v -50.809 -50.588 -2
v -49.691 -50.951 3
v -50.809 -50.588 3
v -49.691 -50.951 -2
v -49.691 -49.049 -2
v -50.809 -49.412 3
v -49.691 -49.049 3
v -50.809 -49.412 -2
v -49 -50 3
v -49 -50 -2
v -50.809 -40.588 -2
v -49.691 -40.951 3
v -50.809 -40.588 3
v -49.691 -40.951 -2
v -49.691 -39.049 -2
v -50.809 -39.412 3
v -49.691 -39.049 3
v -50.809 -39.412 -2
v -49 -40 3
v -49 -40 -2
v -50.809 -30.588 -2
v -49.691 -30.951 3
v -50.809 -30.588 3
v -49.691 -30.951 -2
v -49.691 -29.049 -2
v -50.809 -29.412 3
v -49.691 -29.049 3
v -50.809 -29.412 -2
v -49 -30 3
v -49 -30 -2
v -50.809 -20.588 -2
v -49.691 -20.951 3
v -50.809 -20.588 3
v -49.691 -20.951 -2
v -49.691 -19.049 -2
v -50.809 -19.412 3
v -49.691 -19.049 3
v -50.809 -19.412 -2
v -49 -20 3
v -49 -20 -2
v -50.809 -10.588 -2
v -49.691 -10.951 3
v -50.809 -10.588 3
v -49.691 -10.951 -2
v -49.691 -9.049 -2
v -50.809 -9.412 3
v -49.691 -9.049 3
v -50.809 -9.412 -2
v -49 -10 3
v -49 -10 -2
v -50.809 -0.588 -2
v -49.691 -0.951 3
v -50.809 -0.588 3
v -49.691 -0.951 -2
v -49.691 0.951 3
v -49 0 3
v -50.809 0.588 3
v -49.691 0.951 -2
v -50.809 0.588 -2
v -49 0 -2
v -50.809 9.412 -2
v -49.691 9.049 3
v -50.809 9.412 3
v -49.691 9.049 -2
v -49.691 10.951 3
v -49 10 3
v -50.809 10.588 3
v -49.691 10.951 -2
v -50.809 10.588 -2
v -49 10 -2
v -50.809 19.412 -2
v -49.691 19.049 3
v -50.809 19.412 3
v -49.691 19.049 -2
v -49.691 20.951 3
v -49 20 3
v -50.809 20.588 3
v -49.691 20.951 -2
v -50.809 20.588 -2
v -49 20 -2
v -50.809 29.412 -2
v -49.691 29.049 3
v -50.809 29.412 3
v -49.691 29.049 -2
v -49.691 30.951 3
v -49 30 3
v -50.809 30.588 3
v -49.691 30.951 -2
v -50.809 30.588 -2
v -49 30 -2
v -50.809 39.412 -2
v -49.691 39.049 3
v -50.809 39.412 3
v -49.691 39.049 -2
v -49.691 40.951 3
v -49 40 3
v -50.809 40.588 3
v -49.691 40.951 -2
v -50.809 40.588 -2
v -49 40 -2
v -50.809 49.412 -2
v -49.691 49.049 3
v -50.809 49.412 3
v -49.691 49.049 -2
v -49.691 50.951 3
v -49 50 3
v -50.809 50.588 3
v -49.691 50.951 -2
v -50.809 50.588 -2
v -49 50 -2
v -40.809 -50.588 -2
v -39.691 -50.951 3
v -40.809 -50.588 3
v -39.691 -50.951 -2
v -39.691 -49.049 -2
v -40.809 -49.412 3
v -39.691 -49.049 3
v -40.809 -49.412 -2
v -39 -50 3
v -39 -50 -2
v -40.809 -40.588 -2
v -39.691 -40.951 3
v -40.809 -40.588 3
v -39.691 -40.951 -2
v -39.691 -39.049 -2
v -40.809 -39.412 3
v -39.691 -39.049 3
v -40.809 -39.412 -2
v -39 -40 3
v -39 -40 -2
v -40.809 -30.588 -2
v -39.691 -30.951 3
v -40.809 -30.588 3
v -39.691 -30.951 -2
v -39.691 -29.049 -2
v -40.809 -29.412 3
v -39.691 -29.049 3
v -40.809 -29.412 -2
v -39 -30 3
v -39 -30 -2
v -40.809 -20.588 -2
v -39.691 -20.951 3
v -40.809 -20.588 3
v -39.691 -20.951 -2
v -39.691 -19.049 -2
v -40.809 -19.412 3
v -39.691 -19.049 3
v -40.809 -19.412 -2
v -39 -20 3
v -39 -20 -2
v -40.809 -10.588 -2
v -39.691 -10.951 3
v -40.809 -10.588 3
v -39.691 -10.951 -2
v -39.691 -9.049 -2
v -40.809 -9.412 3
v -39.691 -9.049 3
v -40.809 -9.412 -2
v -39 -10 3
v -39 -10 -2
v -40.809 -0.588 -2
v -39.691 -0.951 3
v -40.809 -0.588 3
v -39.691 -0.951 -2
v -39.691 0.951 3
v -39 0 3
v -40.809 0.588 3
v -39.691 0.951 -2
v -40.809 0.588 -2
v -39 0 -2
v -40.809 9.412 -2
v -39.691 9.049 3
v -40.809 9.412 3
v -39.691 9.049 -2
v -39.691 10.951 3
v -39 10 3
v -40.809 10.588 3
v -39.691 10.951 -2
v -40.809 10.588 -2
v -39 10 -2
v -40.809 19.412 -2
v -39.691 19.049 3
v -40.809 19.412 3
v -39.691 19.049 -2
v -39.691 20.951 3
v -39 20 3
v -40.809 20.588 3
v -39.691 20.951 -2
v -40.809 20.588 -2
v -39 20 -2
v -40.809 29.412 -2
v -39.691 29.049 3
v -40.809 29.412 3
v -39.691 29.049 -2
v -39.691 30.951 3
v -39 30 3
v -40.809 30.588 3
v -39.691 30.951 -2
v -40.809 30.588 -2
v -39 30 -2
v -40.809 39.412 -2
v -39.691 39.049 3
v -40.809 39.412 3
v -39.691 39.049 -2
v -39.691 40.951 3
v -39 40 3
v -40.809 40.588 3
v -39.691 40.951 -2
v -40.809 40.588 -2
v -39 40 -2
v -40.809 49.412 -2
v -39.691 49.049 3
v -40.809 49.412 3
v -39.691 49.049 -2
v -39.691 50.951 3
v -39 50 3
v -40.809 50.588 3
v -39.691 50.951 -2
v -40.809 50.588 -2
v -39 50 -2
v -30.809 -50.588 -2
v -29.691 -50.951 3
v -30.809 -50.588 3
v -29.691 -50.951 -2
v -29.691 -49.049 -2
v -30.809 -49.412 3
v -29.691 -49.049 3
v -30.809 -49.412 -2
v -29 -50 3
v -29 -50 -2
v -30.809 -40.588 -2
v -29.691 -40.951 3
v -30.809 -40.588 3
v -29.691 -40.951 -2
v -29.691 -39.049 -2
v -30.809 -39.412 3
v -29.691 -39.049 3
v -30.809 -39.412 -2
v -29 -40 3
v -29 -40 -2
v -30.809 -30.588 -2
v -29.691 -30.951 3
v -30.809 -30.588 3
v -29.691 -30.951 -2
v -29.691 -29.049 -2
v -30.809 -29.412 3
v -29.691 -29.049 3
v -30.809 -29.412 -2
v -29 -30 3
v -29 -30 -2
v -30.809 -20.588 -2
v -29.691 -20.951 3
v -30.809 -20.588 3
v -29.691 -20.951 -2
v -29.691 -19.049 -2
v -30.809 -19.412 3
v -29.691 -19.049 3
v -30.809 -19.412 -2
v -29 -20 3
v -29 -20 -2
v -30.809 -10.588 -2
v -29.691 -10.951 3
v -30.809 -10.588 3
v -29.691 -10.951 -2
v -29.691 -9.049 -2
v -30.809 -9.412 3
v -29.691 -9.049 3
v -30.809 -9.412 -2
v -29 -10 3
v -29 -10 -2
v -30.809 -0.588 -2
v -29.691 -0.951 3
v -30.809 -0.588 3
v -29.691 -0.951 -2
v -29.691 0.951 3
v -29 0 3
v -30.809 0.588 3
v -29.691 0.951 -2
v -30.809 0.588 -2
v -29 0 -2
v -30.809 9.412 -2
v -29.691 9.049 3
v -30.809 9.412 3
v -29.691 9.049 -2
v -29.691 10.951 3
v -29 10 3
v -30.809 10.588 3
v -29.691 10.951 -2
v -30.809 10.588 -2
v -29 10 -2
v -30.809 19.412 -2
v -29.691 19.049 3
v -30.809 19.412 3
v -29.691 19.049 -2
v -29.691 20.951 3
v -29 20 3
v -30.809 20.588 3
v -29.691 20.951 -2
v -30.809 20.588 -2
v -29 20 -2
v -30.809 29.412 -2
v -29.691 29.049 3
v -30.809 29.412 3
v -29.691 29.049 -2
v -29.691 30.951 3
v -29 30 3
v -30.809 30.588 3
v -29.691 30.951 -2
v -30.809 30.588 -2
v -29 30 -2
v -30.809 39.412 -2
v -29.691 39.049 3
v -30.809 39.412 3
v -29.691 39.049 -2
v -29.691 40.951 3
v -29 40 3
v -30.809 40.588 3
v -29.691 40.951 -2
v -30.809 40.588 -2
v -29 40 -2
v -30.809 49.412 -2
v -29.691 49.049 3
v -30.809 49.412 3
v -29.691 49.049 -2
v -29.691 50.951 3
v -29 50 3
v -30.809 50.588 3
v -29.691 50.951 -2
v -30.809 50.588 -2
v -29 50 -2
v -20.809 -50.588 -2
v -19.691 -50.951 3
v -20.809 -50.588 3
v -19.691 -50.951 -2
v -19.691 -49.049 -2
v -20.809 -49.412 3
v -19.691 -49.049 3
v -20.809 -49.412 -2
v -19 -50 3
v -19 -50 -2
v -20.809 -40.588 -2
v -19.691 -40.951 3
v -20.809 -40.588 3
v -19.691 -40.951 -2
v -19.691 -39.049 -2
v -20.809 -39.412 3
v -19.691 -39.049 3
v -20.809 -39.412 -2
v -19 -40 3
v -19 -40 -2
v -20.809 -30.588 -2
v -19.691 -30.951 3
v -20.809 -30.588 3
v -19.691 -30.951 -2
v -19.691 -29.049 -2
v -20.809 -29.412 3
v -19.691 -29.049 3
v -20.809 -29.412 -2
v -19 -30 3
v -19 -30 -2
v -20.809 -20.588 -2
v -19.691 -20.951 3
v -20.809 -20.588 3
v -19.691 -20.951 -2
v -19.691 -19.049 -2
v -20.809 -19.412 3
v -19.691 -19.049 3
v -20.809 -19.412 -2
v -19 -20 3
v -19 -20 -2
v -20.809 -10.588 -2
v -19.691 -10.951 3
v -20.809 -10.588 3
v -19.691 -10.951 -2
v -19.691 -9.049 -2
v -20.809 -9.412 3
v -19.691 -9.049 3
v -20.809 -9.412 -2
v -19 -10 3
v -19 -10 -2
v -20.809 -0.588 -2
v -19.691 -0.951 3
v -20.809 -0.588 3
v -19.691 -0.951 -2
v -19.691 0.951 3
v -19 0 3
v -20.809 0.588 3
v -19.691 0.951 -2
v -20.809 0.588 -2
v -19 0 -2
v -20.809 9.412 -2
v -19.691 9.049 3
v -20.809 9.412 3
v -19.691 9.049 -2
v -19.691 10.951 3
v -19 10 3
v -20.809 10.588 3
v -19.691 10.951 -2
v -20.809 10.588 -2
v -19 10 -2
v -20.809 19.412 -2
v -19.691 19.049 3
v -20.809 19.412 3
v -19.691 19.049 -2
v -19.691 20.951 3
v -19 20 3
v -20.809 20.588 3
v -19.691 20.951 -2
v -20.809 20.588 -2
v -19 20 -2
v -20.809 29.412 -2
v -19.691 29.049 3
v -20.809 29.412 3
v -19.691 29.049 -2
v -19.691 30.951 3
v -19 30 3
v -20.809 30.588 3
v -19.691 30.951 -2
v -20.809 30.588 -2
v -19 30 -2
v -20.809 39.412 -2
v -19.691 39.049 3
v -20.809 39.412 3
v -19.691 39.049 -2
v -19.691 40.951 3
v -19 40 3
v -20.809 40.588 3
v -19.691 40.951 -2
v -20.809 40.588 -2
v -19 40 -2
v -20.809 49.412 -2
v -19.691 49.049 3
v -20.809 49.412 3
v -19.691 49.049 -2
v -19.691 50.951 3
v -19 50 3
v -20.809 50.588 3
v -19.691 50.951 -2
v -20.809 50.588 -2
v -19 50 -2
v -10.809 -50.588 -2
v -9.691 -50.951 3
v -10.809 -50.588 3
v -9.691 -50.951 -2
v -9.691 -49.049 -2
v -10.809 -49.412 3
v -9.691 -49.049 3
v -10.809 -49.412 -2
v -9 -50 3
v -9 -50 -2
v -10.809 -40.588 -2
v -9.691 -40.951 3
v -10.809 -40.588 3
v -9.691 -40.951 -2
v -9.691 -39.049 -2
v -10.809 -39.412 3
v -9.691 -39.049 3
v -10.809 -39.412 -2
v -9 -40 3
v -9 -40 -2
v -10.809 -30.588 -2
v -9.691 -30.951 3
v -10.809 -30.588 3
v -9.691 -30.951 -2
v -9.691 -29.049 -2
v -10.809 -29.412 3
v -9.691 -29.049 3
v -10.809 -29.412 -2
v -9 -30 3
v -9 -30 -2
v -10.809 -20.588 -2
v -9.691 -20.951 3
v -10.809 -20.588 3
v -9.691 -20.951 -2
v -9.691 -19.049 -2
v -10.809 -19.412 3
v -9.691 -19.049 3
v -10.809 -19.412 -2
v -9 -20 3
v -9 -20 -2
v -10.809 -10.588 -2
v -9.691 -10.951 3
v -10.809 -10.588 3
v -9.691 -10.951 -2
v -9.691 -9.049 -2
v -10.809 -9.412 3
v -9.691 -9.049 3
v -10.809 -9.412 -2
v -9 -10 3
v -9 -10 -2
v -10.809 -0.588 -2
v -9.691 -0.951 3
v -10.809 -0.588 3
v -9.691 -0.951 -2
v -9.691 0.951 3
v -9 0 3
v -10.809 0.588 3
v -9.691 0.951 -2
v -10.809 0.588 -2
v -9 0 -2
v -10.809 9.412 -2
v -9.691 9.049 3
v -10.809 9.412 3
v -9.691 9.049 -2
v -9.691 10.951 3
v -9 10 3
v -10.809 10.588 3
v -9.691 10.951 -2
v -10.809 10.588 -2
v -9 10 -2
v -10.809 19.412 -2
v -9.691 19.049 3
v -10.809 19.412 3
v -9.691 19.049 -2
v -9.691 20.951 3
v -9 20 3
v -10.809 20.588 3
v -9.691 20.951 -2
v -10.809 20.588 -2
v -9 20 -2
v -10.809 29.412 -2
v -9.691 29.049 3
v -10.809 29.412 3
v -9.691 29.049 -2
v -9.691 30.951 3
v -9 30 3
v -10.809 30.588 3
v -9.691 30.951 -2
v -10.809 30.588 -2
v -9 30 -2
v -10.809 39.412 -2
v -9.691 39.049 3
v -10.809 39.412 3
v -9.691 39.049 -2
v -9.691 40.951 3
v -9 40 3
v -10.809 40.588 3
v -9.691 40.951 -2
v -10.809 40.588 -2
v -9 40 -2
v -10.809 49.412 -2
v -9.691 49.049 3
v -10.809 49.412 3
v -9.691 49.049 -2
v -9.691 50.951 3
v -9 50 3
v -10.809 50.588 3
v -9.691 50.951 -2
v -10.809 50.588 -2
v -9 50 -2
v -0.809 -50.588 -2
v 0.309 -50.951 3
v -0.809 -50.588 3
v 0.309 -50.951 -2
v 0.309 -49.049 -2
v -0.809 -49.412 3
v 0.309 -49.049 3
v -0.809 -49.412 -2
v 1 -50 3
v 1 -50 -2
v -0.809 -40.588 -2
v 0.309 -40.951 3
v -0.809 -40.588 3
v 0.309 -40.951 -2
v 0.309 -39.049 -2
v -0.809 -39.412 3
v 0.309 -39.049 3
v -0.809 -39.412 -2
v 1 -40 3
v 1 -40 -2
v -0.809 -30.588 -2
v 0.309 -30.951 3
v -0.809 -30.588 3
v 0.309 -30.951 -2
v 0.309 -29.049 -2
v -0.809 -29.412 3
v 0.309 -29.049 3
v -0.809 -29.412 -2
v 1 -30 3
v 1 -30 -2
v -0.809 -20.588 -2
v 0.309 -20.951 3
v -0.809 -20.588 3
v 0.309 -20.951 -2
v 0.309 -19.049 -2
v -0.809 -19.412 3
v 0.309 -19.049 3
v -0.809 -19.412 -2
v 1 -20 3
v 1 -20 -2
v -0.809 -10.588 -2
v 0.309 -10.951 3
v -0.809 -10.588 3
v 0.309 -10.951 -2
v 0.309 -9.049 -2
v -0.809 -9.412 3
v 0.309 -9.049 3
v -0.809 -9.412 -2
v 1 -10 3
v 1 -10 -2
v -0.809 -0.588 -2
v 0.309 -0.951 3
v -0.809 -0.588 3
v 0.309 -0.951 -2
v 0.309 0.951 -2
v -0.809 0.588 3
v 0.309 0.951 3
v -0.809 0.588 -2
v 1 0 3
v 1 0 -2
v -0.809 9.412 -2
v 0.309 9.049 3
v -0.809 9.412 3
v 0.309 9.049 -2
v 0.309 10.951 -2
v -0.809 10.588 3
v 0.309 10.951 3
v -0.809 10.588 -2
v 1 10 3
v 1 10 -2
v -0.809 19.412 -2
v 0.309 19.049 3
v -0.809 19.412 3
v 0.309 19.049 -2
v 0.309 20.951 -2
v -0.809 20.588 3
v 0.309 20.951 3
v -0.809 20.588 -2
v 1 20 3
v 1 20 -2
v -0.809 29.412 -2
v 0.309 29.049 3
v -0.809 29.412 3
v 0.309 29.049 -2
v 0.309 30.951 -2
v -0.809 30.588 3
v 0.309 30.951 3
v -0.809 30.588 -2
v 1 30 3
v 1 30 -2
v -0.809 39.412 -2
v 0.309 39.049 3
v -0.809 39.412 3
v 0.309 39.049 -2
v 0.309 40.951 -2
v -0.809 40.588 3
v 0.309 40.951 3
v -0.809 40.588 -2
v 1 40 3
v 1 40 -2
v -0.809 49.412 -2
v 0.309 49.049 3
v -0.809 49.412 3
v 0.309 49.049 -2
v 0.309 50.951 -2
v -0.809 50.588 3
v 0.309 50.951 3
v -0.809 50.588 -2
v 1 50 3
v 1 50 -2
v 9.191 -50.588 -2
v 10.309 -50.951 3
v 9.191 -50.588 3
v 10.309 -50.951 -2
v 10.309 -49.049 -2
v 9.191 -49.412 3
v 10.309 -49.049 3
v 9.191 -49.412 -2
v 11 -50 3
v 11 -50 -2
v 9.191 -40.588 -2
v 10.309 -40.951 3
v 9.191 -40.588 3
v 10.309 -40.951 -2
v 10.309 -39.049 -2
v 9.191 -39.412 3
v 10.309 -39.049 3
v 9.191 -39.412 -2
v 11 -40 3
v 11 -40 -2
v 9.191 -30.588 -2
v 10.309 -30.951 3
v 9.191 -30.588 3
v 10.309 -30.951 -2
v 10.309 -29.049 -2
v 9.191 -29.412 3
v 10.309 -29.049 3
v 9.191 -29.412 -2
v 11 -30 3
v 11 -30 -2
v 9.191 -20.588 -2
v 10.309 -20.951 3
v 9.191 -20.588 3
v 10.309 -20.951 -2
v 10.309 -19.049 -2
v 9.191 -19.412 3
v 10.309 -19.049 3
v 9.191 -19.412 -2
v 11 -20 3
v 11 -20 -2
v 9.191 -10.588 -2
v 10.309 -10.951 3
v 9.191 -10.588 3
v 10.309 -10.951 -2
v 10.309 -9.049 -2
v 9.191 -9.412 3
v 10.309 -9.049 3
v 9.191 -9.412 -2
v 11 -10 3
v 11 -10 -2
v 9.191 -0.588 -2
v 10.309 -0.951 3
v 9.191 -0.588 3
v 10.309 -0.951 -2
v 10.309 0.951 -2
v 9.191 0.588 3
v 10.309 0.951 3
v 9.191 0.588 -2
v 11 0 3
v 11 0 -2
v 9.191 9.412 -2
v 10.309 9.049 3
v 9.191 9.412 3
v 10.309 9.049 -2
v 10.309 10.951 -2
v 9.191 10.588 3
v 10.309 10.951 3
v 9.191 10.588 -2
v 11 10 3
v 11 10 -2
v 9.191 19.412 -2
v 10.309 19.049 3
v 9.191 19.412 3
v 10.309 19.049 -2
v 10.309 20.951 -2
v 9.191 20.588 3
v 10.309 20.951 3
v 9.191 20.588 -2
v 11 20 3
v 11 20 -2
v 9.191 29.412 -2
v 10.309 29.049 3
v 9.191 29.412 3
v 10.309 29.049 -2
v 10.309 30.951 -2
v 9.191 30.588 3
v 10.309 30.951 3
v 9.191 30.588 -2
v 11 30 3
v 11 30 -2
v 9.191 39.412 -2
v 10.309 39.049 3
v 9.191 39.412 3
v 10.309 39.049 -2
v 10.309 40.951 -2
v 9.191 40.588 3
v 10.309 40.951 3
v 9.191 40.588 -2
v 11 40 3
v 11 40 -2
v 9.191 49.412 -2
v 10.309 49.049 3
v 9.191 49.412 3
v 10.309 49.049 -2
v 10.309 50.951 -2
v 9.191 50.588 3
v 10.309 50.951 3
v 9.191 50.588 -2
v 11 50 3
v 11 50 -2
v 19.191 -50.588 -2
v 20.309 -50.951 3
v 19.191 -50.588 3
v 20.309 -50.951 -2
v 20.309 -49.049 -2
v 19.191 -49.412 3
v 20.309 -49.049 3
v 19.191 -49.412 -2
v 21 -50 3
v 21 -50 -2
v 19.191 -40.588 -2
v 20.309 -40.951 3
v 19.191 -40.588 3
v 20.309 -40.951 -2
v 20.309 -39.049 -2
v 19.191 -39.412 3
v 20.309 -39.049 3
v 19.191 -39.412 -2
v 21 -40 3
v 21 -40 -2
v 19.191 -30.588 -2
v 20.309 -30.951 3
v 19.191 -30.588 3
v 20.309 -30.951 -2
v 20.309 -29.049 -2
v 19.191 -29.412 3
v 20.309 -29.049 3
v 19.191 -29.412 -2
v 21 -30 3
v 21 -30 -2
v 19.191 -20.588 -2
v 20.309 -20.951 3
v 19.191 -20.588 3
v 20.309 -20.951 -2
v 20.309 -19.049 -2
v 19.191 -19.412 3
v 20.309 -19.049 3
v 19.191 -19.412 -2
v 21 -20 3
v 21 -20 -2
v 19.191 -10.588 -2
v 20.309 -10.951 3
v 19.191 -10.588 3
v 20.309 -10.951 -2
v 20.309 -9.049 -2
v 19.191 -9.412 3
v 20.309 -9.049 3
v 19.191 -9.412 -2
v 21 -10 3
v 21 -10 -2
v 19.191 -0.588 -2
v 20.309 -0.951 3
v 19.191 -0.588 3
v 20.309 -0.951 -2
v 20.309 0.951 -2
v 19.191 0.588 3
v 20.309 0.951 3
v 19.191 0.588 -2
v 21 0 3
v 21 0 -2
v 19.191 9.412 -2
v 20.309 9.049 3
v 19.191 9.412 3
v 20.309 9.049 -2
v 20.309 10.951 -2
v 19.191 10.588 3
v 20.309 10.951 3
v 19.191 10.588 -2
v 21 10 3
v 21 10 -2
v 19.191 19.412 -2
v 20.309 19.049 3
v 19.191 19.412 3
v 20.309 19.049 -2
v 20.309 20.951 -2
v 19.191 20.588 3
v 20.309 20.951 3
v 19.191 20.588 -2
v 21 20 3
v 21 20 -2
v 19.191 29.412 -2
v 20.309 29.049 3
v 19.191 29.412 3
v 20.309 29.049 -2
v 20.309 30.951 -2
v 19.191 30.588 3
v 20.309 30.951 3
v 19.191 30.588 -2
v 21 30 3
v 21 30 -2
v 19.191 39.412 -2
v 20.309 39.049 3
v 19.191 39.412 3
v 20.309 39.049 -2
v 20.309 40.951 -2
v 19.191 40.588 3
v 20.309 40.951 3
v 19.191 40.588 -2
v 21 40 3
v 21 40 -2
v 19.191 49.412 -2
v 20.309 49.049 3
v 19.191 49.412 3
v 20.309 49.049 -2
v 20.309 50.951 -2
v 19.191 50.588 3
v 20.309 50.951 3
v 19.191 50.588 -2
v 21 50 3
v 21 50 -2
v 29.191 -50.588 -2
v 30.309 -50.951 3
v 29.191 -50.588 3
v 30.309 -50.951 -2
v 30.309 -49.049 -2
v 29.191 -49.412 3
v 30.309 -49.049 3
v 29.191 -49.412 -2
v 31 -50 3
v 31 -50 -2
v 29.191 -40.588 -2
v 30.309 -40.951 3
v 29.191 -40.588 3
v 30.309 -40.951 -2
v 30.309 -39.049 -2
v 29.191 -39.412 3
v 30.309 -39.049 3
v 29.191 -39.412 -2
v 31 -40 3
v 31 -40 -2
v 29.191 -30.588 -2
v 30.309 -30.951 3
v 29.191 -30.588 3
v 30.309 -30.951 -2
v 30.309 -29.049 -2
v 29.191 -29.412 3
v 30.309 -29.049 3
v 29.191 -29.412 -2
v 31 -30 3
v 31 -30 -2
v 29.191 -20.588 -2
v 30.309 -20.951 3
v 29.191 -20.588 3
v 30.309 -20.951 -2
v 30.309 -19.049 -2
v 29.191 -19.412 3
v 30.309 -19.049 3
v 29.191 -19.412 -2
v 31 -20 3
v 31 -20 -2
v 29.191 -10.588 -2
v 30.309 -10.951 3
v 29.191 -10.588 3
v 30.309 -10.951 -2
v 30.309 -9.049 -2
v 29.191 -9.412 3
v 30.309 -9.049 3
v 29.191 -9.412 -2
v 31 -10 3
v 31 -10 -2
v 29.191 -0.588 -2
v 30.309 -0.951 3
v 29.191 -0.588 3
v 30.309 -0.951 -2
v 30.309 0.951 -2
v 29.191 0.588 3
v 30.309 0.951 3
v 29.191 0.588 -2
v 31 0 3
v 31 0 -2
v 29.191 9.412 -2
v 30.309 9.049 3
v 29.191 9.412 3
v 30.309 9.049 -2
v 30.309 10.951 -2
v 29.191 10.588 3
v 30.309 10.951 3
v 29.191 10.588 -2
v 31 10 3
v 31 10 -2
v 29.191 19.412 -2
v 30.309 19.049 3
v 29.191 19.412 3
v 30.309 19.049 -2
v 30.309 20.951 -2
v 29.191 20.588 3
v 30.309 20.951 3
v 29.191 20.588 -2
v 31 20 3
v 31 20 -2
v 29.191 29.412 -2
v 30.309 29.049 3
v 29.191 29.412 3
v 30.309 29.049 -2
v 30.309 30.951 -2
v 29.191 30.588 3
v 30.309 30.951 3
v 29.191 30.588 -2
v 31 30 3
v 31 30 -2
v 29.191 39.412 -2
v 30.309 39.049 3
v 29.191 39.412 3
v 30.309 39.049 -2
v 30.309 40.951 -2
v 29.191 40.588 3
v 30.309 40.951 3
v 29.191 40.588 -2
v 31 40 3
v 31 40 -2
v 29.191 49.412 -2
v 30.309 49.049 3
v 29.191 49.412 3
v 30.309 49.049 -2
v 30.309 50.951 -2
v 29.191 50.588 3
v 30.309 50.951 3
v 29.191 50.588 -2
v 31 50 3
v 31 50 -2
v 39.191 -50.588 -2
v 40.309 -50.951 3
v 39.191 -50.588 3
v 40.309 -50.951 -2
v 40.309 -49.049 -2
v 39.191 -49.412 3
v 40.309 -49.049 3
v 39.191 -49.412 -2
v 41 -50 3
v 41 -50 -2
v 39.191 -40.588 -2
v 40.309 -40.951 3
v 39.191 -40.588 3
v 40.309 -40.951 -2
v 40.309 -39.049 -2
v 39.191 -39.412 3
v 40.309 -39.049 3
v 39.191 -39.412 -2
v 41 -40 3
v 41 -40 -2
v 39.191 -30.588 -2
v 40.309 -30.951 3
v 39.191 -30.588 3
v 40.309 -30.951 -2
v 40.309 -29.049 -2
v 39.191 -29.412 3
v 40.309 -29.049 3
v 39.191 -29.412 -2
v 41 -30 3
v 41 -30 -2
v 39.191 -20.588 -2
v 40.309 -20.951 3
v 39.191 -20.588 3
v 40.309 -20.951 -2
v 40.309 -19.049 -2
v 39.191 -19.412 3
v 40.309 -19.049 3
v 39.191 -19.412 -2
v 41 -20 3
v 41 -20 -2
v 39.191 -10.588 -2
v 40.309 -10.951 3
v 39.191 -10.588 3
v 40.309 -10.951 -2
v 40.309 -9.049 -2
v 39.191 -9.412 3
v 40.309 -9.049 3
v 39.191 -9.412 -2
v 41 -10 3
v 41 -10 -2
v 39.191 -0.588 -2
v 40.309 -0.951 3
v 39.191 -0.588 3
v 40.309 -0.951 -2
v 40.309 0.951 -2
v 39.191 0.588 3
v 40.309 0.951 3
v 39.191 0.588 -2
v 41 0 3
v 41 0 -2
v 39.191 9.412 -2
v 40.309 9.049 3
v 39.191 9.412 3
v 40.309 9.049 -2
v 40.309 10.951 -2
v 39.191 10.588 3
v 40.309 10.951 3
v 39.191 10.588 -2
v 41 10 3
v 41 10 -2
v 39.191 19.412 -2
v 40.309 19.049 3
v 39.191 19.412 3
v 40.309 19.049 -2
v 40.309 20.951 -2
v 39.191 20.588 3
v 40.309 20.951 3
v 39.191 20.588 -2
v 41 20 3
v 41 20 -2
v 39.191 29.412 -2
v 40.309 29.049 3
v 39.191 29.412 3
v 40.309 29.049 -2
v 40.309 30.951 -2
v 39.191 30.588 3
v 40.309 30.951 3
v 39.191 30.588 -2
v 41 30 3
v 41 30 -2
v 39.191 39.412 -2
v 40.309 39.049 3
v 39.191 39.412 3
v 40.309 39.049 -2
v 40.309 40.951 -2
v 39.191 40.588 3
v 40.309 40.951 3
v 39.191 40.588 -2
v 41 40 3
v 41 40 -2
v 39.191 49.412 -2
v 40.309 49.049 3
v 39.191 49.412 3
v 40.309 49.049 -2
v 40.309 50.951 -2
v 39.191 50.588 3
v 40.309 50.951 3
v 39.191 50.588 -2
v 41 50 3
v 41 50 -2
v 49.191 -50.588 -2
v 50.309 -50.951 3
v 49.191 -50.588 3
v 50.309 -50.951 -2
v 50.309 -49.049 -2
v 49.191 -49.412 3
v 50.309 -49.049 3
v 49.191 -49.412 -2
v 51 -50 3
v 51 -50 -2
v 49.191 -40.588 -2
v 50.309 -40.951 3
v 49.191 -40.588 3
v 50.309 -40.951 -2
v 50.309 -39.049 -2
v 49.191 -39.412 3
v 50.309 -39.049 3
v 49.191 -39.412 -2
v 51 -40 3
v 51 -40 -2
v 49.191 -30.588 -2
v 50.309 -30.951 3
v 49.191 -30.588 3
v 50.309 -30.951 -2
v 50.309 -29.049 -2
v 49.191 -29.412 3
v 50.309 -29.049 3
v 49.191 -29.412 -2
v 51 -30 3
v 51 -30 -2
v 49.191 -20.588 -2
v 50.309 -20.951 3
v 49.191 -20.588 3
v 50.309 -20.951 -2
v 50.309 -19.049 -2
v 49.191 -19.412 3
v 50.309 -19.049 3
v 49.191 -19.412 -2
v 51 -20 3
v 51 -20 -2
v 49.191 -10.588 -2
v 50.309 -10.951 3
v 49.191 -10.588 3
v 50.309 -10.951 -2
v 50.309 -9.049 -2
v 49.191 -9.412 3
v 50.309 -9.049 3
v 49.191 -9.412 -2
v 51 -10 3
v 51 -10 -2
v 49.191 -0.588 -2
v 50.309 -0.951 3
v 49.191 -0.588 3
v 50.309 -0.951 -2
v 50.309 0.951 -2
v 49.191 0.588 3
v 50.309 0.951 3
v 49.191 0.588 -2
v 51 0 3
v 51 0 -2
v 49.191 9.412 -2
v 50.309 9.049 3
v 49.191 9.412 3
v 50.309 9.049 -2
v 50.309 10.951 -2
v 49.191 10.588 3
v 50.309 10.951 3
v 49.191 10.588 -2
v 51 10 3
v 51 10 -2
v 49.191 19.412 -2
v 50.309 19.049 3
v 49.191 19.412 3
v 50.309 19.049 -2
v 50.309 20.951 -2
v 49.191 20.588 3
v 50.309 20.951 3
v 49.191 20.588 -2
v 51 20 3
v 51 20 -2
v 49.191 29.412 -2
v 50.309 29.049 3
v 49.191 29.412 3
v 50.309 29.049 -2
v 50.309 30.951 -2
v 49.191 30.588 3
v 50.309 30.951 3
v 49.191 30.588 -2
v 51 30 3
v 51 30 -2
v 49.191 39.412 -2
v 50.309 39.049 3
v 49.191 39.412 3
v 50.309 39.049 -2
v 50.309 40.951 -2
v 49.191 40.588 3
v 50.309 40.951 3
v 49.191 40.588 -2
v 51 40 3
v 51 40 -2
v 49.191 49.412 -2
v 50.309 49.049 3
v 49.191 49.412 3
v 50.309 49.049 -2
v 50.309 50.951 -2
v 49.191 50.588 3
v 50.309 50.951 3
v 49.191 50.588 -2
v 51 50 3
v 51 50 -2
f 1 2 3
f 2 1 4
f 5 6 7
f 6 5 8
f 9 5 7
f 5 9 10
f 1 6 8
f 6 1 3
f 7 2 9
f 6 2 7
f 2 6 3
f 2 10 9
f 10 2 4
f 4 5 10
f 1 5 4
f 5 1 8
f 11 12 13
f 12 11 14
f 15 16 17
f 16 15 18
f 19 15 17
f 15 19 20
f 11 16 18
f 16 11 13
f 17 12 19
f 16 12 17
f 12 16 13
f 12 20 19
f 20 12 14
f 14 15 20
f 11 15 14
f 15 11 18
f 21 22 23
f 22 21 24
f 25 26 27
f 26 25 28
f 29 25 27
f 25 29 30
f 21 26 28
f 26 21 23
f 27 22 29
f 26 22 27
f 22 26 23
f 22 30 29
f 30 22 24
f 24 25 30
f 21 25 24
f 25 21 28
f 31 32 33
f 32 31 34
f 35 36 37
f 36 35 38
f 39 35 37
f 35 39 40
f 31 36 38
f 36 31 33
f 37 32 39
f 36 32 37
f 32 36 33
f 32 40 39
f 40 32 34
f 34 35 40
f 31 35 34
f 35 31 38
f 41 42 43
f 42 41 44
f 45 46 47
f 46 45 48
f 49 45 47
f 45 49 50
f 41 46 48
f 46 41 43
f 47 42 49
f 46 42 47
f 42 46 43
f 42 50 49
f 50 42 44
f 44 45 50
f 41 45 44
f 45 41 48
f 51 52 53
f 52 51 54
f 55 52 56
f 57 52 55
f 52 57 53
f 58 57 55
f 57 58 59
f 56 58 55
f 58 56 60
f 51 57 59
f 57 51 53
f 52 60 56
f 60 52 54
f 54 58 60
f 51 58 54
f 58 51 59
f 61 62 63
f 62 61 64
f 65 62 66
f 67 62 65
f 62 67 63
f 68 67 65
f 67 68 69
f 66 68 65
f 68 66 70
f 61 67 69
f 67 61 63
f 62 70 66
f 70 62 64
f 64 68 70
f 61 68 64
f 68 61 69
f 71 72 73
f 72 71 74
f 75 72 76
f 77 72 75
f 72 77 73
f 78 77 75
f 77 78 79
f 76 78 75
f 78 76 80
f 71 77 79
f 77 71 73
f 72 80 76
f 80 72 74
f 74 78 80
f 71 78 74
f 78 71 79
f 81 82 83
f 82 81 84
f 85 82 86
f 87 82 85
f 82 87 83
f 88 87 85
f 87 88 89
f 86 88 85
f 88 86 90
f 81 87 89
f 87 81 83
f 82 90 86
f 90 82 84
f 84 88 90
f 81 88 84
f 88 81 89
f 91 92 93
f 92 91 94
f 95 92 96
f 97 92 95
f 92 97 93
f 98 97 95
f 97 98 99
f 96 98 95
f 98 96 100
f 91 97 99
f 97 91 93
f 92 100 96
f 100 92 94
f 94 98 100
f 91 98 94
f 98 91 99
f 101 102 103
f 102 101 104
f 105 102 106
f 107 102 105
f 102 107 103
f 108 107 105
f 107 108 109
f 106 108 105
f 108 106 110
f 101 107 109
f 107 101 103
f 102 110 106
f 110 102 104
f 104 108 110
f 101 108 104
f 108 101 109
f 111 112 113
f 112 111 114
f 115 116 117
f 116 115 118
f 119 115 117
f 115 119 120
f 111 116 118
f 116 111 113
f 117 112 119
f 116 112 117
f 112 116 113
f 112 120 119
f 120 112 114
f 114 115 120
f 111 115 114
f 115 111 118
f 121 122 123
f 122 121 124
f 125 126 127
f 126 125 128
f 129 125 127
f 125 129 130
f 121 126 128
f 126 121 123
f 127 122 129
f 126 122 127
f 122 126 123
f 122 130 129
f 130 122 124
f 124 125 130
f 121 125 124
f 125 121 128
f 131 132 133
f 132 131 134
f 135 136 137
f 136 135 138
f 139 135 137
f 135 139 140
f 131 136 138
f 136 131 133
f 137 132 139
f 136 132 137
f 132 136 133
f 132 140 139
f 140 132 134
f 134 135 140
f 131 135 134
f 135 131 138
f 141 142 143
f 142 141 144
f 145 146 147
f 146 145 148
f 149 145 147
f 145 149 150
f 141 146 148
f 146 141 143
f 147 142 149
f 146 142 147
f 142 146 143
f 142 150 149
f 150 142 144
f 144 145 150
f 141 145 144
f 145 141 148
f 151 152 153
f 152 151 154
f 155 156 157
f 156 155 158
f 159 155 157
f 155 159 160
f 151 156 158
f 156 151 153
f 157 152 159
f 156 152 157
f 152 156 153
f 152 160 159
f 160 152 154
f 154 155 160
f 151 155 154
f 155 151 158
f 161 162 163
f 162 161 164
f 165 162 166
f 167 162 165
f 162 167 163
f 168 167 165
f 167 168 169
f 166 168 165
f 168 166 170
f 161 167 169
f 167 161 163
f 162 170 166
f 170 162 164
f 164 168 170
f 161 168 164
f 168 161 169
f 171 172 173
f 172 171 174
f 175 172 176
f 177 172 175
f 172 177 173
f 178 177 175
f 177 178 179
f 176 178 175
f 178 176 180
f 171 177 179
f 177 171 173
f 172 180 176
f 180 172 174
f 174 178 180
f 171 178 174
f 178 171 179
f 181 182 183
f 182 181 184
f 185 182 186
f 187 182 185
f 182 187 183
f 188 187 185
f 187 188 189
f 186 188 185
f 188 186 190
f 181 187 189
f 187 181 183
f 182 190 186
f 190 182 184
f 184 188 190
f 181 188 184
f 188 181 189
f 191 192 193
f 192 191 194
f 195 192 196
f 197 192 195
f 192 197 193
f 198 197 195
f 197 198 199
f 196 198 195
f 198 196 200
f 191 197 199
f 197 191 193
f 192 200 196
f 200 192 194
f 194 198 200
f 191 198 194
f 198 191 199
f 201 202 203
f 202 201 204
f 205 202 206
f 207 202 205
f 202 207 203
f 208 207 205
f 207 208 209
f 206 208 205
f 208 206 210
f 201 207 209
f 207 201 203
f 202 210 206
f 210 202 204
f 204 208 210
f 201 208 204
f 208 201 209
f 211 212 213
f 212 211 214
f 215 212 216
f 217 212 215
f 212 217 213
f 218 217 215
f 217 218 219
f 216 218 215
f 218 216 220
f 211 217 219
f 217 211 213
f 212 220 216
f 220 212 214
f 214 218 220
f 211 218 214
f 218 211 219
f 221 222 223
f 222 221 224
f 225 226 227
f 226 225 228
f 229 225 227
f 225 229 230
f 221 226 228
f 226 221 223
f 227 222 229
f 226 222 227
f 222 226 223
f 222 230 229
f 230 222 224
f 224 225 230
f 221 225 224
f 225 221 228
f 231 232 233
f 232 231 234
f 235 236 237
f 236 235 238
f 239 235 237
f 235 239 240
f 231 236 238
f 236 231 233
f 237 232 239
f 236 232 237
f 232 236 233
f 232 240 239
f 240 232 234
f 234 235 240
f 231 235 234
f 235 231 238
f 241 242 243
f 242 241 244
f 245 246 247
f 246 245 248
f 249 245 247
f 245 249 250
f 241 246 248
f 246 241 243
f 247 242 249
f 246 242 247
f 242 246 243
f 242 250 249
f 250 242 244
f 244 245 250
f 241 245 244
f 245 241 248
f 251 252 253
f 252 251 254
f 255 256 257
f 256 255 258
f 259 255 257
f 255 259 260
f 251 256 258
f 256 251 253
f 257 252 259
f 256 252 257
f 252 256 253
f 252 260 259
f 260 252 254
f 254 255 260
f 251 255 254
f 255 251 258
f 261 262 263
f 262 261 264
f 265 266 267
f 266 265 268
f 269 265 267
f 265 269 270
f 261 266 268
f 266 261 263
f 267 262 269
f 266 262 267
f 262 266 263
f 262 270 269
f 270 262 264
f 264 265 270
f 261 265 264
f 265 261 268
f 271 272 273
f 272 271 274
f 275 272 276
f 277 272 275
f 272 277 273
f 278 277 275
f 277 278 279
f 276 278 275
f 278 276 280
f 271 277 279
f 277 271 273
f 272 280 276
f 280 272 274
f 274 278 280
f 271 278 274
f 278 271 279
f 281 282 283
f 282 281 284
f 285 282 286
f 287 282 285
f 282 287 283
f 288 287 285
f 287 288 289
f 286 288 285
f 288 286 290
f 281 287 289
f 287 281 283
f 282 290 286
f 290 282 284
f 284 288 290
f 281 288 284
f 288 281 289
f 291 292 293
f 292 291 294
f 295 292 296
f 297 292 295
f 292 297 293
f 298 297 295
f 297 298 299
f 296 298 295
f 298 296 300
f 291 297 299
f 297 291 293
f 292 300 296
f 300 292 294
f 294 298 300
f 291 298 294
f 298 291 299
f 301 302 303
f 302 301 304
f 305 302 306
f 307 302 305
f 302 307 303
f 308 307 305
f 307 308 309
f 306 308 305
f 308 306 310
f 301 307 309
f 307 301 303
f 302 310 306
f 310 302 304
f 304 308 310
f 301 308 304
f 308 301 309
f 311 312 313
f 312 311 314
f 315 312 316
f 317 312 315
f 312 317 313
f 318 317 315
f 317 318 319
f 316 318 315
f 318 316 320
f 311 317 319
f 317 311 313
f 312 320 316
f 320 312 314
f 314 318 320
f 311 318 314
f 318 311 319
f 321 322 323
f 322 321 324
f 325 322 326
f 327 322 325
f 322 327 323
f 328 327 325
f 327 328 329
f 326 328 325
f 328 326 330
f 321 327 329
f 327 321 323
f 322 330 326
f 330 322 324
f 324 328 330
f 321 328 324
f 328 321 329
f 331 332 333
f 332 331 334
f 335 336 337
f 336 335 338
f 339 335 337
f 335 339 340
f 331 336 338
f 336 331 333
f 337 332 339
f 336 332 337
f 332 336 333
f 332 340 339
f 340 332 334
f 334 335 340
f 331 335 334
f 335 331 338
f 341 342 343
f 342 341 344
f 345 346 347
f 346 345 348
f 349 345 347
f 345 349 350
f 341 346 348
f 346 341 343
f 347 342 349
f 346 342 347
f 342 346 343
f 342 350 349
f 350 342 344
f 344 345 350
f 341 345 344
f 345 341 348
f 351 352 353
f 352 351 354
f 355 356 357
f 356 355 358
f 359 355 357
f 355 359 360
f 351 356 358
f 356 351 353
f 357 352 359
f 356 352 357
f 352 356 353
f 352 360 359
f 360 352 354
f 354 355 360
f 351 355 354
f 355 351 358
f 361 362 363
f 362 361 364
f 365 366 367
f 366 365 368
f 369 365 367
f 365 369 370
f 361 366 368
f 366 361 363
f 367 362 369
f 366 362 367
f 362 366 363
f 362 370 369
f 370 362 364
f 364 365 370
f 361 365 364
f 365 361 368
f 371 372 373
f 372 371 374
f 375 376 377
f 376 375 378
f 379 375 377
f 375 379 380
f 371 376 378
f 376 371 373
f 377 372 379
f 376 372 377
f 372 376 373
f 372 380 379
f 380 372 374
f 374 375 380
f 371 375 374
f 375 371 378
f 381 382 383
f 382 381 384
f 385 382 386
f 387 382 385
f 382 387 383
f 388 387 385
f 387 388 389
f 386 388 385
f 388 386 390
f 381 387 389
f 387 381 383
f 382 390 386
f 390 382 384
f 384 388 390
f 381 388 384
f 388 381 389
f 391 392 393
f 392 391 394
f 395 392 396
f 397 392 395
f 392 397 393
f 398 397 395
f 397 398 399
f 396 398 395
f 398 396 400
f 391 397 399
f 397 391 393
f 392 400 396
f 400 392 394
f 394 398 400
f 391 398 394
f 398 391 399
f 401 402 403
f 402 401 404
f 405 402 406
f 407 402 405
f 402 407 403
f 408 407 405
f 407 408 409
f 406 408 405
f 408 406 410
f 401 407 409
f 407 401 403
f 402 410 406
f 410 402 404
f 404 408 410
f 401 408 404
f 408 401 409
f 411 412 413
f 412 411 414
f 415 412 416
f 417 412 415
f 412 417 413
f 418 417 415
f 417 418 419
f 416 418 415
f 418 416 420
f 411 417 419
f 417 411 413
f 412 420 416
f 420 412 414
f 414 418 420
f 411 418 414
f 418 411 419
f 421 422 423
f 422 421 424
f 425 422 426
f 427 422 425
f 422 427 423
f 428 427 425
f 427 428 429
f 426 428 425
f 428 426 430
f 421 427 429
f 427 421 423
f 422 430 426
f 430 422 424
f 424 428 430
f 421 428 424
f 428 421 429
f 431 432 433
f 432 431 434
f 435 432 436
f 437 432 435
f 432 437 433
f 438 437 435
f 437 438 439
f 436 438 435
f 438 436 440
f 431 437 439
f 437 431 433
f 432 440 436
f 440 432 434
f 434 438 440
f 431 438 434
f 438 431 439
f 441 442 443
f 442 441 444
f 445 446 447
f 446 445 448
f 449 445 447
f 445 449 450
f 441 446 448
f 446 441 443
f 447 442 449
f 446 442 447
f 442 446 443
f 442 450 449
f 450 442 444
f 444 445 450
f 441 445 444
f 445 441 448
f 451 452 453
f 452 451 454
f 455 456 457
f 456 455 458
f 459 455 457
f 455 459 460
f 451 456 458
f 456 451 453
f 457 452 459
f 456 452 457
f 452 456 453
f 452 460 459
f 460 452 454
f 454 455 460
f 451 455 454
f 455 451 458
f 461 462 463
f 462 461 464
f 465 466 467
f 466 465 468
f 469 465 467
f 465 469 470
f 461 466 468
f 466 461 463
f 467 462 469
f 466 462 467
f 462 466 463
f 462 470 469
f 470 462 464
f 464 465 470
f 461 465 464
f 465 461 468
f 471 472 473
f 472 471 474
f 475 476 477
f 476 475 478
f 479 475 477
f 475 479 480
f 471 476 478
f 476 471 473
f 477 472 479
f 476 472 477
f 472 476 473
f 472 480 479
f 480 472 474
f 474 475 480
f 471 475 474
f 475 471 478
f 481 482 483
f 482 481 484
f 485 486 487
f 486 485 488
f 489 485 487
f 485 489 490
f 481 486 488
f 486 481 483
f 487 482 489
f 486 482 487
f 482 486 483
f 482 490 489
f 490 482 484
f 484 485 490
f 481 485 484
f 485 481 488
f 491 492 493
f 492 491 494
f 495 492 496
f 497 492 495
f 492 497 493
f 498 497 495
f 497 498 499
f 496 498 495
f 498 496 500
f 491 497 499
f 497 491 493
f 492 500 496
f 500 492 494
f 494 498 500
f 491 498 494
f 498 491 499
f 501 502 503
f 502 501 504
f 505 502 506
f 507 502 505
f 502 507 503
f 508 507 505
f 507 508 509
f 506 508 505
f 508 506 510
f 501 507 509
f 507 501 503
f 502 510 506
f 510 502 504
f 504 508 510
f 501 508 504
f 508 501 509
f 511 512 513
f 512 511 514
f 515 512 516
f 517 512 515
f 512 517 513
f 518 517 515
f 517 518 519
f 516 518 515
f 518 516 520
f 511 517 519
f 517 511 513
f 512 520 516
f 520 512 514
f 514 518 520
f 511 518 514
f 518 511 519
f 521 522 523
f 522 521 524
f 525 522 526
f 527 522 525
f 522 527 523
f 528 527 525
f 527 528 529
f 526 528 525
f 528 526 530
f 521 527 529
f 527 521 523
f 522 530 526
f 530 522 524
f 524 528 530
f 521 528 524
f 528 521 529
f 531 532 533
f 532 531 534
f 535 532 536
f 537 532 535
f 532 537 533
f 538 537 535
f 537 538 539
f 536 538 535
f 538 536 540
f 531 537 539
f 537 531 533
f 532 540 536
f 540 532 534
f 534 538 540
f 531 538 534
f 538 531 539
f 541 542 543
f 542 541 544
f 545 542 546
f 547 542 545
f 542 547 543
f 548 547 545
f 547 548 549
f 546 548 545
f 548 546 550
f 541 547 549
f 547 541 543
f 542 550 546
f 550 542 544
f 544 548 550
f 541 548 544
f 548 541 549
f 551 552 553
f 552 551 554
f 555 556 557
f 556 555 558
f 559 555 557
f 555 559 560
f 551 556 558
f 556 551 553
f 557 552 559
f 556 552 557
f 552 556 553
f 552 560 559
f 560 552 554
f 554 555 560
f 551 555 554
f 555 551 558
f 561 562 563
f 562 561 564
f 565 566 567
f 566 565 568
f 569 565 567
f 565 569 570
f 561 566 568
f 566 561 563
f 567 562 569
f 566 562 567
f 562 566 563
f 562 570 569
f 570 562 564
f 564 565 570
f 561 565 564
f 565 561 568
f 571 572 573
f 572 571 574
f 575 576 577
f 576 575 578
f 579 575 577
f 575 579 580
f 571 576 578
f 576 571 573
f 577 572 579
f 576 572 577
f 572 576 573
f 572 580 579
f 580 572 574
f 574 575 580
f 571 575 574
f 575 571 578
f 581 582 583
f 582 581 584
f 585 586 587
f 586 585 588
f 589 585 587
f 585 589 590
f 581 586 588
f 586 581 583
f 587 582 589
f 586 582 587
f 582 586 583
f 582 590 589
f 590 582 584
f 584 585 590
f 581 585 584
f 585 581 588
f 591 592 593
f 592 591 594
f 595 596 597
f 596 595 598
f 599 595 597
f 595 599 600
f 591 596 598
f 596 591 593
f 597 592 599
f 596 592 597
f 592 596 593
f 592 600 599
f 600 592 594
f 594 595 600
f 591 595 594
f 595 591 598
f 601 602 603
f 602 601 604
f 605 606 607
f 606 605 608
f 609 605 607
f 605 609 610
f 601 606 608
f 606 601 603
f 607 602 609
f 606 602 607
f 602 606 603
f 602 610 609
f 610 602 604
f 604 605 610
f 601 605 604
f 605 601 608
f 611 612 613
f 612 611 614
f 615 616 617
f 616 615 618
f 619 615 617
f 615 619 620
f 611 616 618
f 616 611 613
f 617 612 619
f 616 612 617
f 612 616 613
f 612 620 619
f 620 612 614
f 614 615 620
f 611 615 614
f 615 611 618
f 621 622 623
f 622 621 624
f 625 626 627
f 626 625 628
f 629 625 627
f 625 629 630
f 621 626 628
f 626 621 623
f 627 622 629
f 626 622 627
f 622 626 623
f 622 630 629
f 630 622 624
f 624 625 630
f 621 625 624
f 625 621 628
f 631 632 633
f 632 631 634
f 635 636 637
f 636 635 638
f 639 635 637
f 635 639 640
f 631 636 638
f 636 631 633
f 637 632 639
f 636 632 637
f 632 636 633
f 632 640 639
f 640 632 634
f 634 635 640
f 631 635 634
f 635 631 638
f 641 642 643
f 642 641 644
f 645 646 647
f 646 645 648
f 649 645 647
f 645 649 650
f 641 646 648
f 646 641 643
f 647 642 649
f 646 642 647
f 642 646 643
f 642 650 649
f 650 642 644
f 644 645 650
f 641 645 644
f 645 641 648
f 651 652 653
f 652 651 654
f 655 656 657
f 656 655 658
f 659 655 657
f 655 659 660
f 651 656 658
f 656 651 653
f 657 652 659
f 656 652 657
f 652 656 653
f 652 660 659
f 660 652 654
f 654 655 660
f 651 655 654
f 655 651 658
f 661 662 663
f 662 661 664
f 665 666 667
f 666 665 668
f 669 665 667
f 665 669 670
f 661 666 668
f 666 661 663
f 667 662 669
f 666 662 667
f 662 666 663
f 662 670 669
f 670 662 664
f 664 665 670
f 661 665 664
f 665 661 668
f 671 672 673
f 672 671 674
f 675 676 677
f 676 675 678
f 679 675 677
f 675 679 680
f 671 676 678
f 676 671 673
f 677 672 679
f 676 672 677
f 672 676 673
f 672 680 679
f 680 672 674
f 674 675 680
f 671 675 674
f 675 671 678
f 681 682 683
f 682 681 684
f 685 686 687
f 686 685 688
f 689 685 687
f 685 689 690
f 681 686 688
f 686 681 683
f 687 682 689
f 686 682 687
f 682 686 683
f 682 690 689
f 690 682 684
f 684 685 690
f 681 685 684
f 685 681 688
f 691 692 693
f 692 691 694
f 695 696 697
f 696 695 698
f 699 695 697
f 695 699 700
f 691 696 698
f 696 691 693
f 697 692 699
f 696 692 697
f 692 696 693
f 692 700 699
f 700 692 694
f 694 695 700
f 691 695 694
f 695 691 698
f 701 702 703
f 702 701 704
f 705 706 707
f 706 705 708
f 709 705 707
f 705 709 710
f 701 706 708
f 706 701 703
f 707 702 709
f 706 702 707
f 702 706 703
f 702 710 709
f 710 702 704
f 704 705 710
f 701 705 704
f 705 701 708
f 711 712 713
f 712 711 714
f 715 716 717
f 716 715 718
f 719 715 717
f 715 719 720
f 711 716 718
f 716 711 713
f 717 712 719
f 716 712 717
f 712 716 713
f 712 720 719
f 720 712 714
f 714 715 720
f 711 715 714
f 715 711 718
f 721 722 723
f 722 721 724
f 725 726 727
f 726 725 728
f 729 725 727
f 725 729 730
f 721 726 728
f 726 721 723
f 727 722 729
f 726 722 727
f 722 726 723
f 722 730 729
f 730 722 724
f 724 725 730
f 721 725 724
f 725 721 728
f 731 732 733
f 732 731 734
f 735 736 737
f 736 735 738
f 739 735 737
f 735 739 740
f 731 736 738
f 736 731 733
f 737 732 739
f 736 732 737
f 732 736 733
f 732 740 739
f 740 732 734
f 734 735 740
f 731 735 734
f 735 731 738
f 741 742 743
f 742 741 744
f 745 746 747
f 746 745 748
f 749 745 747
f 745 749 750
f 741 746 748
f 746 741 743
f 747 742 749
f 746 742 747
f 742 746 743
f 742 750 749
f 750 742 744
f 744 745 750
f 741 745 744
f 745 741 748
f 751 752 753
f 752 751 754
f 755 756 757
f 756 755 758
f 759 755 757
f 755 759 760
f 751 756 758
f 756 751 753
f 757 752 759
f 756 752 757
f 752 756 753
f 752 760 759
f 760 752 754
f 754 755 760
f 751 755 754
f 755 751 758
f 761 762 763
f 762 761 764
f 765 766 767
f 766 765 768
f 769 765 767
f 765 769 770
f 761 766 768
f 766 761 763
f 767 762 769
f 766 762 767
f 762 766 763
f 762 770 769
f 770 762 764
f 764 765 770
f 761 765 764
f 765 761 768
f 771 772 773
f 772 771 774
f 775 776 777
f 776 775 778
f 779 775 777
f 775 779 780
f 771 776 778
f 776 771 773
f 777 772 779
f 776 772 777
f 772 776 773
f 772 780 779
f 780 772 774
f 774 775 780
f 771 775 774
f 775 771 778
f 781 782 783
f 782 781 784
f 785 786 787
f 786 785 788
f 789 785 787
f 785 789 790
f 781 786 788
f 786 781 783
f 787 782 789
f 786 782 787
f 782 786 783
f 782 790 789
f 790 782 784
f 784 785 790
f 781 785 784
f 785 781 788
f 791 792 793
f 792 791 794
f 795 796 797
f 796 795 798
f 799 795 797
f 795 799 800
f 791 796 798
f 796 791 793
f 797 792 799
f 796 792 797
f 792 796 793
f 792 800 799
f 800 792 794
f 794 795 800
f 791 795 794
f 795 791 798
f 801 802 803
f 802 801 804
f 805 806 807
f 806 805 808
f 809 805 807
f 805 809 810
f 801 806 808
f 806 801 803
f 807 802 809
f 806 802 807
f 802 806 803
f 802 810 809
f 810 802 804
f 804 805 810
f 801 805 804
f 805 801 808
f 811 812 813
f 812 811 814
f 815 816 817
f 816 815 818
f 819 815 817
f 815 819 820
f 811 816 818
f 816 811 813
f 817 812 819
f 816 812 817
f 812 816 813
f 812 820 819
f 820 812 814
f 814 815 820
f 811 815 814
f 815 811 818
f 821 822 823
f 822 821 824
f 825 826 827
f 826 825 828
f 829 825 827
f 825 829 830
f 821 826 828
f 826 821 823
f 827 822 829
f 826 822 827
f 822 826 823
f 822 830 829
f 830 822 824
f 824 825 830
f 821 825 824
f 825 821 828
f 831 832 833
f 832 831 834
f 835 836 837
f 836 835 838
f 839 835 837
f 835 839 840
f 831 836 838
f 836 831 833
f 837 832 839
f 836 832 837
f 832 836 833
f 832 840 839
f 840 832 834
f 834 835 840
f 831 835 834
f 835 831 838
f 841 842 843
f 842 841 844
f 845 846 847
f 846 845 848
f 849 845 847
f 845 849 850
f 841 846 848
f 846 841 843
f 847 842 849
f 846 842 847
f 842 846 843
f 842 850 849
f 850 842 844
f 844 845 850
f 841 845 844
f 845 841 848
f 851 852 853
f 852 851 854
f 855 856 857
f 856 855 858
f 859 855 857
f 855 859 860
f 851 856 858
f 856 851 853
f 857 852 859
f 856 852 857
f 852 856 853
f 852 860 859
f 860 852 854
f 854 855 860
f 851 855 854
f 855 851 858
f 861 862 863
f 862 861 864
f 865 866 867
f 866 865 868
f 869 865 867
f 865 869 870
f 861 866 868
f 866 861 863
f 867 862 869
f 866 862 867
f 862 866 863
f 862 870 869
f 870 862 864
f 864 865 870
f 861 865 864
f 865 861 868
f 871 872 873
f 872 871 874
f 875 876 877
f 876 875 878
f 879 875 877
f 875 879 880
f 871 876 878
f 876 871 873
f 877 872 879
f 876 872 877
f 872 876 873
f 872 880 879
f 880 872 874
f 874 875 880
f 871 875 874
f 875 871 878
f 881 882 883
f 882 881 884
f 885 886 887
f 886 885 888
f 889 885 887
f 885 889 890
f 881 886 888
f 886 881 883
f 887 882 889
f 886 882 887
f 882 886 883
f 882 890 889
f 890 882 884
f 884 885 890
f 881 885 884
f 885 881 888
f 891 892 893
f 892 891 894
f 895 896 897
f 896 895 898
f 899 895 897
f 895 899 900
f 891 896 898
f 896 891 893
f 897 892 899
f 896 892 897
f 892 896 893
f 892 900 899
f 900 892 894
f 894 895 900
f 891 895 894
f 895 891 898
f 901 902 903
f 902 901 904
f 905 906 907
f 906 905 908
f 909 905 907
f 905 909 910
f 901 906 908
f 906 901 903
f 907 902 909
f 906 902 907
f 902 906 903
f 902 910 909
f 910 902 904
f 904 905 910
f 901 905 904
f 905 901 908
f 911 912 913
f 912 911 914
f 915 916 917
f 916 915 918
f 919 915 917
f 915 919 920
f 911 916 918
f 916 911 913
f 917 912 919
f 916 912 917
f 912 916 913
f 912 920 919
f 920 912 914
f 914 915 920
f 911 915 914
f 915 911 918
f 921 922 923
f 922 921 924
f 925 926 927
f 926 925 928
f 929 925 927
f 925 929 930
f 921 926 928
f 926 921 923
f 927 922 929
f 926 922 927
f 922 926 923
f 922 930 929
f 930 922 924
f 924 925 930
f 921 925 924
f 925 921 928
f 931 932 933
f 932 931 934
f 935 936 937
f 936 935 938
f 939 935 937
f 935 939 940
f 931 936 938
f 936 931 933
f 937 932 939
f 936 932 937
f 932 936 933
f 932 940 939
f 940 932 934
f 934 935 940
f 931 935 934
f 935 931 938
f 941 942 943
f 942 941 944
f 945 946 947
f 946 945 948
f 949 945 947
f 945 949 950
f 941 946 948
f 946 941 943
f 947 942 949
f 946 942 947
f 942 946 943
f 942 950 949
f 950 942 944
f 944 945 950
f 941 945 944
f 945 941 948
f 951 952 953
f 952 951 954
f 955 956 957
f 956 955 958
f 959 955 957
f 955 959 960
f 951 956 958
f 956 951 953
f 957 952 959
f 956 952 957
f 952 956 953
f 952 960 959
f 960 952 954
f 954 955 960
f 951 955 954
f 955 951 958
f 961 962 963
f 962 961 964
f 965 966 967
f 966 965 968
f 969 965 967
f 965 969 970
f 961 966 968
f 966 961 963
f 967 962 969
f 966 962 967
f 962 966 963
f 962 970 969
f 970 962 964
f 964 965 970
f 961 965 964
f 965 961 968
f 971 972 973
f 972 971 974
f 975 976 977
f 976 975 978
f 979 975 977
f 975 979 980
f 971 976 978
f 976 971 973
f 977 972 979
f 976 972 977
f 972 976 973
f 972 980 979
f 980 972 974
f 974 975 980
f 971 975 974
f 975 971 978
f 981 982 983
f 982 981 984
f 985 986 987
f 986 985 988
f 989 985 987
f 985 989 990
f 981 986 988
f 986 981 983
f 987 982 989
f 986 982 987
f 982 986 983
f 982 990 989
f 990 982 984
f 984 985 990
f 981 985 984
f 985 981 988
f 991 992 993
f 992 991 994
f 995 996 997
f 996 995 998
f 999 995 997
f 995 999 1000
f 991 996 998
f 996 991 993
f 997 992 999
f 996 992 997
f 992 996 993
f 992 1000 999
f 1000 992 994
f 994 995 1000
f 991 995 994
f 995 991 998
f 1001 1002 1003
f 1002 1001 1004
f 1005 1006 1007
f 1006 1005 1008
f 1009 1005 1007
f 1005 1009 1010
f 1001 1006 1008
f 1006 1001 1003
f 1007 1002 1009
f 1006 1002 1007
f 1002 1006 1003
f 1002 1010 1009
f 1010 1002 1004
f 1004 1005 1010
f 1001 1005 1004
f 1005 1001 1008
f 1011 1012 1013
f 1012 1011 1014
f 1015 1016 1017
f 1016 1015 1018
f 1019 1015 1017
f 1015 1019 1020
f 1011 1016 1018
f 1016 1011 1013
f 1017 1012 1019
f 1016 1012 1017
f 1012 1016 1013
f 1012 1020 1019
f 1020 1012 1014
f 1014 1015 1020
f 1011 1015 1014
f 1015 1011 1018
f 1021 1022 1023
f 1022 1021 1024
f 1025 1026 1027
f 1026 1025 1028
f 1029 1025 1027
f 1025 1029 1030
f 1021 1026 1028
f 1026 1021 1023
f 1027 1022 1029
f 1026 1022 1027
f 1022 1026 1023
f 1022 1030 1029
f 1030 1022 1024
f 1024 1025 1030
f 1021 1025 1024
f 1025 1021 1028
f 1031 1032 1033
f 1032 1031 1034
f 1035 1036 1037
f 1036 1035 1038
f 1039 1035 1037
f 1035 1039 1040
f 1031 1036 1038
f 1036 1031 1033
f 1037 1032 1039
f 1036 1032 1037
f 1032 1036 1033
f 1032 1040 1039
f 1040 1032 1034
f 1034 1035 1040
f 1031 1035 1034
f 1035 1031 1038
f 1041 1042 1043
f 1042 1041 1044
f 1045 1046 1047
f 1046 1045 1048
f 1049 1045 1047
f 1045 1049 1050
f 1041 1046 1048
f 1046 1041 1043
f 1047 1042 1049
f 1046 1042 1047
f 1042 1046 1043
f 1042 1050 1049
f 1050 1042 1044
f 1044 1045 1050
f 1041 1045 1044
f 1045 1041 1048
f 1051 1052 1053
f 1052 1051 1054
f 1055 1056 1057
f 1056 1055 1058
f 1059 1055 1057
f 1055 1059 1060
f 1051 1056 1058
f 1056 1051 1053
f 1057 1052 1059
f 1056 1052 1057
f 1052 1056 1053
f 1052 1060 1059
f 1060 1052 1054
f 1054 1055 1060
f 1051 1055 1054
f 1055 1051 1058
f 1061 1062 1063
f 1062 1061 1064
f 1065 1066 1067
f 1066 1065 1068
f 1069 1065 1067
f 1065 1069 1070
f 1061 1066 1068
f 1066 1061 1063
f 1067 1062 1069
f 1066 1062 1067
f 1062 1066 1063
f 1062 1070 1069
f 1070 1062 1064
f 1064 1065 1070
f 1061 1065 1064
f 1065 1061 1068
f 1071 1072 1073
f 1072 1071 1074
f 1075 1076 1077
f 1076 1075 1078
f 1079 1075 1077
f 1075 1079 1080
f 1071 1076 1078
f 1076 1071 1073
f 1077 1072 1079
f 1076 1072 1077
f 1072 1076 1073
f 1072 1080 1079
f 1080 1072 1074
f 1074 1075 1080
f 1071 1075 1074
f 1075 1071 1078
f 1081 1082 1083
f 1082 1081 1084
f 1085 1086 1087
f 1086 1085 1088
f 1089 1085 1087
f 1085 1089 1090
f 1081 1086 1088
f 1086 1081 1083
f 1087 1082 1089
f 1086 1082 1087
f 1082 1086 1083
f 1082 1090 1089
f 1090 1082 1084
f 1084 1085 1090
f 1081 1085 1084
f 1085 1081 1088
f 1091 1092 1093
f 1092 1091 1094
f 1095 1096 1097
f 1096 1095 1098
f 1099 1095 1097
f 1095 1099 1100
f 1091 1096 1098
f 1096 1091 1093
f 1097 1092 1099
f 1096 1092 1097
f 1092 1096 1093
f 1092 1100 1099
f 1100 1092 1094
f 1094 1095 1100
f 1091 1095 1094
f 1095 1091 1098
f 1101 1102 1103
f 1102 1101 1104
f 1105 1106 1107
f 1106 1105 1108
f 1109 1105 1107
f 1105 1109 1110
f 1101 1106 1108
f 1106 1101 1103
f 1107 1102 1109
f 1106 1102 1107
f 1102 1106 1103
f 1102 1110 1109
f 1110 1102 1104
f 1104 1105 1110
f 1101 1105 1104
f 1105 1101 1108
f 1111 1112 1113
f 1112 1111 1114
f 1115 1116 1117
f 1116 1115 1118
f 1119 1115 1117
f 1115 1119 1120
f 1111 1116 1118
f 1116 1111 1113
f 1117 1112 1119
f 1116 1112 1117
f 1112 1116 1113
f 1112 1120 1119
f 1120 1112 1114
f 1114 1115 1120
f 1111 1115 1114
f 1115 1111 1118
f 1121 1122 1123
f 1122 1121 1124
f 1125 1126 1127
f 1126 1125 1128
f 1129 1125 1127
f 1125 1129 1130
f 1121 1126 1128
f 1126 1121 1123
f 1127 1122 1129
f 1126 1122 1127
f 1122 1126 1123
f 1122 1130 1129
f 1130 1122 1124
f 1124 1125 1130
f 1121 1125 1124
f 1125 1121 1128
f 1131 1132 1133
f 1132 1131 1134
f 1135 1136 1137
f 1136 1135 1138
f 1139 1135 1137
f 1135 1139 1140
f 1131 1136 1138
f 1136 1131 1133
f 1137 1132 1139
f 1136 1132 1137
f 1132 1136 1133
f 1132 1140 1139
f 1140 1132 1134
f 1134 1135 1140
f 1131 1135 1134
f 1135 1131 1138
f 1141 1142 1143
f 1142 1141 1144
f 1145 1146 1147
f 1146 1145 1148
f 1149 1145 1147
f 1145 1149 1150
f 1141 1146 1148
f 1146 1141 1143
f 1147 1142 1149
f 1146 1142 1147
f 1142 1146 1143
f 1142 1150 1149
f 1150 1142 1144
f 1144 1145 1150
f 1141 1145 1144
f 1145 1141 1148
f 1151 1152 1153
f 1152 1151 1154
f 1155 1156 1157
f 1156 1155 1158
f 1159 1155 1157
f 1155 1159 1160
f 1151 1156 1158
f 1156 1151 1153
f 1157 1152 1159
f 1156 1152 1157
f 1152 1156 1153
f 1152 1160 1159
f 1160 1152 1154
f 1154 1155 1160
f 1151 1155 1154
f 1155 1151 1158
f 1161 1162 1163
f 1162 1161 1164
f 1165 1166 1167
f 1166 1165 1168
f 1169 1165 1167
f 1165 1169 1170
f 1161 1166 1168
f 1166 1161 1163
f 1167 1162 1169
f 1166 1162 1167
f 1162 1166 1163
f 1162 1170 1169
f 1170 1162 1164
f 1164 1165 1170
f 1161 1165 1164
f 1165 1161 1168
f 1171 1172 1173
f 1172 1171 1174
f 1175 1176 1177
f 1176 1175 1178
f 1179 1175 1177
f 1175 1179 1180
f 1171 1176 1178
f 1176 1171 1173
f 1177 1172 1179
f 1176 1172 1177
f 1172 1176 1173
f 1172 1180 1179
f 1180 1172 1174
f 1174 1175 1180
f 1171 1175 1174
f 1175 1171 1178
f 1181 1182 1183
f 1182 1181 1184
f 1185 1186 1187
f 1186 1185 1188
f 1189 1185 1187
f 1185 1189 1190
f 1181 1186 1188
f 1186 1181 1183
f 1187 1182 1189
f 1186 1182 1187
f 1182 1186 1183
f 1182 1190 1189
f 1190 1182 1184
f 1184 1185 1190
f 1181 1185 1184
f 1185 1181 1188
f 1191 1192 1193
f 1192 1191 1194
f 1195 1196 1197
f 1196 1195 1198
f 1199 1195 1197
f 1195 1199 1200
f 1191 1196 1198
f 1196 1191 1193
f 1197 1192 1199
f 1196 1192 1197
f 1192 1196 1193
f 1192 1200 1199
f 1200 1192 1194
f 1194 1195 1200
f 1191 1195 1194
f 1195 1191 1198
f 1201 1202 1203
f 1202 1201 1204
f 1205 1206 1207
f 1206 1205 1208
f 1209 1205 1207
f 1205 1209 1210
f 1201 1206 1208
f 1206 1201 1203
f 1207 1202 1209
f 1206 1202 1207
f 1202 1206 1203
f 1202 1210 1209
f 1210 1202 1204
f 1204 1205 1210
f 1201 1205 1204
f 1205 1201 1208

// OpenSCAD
//  This is a quick customizable way to make an array of columns of any size and any size columns


//Defines the area of the  array
a=100;

//Defines the radius of the columns
r=1; //size

//Defines the thickness of the columns
t=5;

//Defines the spacing of the columns
s=10; //space


module array() {

  q = floor(a/2/s);
    for (x=[-q:q])
      for (y=[-q:q])
        translate([x*s,y*s,r/2])
          cylinder(h=t, r=r, ,center=true);
}


array();
